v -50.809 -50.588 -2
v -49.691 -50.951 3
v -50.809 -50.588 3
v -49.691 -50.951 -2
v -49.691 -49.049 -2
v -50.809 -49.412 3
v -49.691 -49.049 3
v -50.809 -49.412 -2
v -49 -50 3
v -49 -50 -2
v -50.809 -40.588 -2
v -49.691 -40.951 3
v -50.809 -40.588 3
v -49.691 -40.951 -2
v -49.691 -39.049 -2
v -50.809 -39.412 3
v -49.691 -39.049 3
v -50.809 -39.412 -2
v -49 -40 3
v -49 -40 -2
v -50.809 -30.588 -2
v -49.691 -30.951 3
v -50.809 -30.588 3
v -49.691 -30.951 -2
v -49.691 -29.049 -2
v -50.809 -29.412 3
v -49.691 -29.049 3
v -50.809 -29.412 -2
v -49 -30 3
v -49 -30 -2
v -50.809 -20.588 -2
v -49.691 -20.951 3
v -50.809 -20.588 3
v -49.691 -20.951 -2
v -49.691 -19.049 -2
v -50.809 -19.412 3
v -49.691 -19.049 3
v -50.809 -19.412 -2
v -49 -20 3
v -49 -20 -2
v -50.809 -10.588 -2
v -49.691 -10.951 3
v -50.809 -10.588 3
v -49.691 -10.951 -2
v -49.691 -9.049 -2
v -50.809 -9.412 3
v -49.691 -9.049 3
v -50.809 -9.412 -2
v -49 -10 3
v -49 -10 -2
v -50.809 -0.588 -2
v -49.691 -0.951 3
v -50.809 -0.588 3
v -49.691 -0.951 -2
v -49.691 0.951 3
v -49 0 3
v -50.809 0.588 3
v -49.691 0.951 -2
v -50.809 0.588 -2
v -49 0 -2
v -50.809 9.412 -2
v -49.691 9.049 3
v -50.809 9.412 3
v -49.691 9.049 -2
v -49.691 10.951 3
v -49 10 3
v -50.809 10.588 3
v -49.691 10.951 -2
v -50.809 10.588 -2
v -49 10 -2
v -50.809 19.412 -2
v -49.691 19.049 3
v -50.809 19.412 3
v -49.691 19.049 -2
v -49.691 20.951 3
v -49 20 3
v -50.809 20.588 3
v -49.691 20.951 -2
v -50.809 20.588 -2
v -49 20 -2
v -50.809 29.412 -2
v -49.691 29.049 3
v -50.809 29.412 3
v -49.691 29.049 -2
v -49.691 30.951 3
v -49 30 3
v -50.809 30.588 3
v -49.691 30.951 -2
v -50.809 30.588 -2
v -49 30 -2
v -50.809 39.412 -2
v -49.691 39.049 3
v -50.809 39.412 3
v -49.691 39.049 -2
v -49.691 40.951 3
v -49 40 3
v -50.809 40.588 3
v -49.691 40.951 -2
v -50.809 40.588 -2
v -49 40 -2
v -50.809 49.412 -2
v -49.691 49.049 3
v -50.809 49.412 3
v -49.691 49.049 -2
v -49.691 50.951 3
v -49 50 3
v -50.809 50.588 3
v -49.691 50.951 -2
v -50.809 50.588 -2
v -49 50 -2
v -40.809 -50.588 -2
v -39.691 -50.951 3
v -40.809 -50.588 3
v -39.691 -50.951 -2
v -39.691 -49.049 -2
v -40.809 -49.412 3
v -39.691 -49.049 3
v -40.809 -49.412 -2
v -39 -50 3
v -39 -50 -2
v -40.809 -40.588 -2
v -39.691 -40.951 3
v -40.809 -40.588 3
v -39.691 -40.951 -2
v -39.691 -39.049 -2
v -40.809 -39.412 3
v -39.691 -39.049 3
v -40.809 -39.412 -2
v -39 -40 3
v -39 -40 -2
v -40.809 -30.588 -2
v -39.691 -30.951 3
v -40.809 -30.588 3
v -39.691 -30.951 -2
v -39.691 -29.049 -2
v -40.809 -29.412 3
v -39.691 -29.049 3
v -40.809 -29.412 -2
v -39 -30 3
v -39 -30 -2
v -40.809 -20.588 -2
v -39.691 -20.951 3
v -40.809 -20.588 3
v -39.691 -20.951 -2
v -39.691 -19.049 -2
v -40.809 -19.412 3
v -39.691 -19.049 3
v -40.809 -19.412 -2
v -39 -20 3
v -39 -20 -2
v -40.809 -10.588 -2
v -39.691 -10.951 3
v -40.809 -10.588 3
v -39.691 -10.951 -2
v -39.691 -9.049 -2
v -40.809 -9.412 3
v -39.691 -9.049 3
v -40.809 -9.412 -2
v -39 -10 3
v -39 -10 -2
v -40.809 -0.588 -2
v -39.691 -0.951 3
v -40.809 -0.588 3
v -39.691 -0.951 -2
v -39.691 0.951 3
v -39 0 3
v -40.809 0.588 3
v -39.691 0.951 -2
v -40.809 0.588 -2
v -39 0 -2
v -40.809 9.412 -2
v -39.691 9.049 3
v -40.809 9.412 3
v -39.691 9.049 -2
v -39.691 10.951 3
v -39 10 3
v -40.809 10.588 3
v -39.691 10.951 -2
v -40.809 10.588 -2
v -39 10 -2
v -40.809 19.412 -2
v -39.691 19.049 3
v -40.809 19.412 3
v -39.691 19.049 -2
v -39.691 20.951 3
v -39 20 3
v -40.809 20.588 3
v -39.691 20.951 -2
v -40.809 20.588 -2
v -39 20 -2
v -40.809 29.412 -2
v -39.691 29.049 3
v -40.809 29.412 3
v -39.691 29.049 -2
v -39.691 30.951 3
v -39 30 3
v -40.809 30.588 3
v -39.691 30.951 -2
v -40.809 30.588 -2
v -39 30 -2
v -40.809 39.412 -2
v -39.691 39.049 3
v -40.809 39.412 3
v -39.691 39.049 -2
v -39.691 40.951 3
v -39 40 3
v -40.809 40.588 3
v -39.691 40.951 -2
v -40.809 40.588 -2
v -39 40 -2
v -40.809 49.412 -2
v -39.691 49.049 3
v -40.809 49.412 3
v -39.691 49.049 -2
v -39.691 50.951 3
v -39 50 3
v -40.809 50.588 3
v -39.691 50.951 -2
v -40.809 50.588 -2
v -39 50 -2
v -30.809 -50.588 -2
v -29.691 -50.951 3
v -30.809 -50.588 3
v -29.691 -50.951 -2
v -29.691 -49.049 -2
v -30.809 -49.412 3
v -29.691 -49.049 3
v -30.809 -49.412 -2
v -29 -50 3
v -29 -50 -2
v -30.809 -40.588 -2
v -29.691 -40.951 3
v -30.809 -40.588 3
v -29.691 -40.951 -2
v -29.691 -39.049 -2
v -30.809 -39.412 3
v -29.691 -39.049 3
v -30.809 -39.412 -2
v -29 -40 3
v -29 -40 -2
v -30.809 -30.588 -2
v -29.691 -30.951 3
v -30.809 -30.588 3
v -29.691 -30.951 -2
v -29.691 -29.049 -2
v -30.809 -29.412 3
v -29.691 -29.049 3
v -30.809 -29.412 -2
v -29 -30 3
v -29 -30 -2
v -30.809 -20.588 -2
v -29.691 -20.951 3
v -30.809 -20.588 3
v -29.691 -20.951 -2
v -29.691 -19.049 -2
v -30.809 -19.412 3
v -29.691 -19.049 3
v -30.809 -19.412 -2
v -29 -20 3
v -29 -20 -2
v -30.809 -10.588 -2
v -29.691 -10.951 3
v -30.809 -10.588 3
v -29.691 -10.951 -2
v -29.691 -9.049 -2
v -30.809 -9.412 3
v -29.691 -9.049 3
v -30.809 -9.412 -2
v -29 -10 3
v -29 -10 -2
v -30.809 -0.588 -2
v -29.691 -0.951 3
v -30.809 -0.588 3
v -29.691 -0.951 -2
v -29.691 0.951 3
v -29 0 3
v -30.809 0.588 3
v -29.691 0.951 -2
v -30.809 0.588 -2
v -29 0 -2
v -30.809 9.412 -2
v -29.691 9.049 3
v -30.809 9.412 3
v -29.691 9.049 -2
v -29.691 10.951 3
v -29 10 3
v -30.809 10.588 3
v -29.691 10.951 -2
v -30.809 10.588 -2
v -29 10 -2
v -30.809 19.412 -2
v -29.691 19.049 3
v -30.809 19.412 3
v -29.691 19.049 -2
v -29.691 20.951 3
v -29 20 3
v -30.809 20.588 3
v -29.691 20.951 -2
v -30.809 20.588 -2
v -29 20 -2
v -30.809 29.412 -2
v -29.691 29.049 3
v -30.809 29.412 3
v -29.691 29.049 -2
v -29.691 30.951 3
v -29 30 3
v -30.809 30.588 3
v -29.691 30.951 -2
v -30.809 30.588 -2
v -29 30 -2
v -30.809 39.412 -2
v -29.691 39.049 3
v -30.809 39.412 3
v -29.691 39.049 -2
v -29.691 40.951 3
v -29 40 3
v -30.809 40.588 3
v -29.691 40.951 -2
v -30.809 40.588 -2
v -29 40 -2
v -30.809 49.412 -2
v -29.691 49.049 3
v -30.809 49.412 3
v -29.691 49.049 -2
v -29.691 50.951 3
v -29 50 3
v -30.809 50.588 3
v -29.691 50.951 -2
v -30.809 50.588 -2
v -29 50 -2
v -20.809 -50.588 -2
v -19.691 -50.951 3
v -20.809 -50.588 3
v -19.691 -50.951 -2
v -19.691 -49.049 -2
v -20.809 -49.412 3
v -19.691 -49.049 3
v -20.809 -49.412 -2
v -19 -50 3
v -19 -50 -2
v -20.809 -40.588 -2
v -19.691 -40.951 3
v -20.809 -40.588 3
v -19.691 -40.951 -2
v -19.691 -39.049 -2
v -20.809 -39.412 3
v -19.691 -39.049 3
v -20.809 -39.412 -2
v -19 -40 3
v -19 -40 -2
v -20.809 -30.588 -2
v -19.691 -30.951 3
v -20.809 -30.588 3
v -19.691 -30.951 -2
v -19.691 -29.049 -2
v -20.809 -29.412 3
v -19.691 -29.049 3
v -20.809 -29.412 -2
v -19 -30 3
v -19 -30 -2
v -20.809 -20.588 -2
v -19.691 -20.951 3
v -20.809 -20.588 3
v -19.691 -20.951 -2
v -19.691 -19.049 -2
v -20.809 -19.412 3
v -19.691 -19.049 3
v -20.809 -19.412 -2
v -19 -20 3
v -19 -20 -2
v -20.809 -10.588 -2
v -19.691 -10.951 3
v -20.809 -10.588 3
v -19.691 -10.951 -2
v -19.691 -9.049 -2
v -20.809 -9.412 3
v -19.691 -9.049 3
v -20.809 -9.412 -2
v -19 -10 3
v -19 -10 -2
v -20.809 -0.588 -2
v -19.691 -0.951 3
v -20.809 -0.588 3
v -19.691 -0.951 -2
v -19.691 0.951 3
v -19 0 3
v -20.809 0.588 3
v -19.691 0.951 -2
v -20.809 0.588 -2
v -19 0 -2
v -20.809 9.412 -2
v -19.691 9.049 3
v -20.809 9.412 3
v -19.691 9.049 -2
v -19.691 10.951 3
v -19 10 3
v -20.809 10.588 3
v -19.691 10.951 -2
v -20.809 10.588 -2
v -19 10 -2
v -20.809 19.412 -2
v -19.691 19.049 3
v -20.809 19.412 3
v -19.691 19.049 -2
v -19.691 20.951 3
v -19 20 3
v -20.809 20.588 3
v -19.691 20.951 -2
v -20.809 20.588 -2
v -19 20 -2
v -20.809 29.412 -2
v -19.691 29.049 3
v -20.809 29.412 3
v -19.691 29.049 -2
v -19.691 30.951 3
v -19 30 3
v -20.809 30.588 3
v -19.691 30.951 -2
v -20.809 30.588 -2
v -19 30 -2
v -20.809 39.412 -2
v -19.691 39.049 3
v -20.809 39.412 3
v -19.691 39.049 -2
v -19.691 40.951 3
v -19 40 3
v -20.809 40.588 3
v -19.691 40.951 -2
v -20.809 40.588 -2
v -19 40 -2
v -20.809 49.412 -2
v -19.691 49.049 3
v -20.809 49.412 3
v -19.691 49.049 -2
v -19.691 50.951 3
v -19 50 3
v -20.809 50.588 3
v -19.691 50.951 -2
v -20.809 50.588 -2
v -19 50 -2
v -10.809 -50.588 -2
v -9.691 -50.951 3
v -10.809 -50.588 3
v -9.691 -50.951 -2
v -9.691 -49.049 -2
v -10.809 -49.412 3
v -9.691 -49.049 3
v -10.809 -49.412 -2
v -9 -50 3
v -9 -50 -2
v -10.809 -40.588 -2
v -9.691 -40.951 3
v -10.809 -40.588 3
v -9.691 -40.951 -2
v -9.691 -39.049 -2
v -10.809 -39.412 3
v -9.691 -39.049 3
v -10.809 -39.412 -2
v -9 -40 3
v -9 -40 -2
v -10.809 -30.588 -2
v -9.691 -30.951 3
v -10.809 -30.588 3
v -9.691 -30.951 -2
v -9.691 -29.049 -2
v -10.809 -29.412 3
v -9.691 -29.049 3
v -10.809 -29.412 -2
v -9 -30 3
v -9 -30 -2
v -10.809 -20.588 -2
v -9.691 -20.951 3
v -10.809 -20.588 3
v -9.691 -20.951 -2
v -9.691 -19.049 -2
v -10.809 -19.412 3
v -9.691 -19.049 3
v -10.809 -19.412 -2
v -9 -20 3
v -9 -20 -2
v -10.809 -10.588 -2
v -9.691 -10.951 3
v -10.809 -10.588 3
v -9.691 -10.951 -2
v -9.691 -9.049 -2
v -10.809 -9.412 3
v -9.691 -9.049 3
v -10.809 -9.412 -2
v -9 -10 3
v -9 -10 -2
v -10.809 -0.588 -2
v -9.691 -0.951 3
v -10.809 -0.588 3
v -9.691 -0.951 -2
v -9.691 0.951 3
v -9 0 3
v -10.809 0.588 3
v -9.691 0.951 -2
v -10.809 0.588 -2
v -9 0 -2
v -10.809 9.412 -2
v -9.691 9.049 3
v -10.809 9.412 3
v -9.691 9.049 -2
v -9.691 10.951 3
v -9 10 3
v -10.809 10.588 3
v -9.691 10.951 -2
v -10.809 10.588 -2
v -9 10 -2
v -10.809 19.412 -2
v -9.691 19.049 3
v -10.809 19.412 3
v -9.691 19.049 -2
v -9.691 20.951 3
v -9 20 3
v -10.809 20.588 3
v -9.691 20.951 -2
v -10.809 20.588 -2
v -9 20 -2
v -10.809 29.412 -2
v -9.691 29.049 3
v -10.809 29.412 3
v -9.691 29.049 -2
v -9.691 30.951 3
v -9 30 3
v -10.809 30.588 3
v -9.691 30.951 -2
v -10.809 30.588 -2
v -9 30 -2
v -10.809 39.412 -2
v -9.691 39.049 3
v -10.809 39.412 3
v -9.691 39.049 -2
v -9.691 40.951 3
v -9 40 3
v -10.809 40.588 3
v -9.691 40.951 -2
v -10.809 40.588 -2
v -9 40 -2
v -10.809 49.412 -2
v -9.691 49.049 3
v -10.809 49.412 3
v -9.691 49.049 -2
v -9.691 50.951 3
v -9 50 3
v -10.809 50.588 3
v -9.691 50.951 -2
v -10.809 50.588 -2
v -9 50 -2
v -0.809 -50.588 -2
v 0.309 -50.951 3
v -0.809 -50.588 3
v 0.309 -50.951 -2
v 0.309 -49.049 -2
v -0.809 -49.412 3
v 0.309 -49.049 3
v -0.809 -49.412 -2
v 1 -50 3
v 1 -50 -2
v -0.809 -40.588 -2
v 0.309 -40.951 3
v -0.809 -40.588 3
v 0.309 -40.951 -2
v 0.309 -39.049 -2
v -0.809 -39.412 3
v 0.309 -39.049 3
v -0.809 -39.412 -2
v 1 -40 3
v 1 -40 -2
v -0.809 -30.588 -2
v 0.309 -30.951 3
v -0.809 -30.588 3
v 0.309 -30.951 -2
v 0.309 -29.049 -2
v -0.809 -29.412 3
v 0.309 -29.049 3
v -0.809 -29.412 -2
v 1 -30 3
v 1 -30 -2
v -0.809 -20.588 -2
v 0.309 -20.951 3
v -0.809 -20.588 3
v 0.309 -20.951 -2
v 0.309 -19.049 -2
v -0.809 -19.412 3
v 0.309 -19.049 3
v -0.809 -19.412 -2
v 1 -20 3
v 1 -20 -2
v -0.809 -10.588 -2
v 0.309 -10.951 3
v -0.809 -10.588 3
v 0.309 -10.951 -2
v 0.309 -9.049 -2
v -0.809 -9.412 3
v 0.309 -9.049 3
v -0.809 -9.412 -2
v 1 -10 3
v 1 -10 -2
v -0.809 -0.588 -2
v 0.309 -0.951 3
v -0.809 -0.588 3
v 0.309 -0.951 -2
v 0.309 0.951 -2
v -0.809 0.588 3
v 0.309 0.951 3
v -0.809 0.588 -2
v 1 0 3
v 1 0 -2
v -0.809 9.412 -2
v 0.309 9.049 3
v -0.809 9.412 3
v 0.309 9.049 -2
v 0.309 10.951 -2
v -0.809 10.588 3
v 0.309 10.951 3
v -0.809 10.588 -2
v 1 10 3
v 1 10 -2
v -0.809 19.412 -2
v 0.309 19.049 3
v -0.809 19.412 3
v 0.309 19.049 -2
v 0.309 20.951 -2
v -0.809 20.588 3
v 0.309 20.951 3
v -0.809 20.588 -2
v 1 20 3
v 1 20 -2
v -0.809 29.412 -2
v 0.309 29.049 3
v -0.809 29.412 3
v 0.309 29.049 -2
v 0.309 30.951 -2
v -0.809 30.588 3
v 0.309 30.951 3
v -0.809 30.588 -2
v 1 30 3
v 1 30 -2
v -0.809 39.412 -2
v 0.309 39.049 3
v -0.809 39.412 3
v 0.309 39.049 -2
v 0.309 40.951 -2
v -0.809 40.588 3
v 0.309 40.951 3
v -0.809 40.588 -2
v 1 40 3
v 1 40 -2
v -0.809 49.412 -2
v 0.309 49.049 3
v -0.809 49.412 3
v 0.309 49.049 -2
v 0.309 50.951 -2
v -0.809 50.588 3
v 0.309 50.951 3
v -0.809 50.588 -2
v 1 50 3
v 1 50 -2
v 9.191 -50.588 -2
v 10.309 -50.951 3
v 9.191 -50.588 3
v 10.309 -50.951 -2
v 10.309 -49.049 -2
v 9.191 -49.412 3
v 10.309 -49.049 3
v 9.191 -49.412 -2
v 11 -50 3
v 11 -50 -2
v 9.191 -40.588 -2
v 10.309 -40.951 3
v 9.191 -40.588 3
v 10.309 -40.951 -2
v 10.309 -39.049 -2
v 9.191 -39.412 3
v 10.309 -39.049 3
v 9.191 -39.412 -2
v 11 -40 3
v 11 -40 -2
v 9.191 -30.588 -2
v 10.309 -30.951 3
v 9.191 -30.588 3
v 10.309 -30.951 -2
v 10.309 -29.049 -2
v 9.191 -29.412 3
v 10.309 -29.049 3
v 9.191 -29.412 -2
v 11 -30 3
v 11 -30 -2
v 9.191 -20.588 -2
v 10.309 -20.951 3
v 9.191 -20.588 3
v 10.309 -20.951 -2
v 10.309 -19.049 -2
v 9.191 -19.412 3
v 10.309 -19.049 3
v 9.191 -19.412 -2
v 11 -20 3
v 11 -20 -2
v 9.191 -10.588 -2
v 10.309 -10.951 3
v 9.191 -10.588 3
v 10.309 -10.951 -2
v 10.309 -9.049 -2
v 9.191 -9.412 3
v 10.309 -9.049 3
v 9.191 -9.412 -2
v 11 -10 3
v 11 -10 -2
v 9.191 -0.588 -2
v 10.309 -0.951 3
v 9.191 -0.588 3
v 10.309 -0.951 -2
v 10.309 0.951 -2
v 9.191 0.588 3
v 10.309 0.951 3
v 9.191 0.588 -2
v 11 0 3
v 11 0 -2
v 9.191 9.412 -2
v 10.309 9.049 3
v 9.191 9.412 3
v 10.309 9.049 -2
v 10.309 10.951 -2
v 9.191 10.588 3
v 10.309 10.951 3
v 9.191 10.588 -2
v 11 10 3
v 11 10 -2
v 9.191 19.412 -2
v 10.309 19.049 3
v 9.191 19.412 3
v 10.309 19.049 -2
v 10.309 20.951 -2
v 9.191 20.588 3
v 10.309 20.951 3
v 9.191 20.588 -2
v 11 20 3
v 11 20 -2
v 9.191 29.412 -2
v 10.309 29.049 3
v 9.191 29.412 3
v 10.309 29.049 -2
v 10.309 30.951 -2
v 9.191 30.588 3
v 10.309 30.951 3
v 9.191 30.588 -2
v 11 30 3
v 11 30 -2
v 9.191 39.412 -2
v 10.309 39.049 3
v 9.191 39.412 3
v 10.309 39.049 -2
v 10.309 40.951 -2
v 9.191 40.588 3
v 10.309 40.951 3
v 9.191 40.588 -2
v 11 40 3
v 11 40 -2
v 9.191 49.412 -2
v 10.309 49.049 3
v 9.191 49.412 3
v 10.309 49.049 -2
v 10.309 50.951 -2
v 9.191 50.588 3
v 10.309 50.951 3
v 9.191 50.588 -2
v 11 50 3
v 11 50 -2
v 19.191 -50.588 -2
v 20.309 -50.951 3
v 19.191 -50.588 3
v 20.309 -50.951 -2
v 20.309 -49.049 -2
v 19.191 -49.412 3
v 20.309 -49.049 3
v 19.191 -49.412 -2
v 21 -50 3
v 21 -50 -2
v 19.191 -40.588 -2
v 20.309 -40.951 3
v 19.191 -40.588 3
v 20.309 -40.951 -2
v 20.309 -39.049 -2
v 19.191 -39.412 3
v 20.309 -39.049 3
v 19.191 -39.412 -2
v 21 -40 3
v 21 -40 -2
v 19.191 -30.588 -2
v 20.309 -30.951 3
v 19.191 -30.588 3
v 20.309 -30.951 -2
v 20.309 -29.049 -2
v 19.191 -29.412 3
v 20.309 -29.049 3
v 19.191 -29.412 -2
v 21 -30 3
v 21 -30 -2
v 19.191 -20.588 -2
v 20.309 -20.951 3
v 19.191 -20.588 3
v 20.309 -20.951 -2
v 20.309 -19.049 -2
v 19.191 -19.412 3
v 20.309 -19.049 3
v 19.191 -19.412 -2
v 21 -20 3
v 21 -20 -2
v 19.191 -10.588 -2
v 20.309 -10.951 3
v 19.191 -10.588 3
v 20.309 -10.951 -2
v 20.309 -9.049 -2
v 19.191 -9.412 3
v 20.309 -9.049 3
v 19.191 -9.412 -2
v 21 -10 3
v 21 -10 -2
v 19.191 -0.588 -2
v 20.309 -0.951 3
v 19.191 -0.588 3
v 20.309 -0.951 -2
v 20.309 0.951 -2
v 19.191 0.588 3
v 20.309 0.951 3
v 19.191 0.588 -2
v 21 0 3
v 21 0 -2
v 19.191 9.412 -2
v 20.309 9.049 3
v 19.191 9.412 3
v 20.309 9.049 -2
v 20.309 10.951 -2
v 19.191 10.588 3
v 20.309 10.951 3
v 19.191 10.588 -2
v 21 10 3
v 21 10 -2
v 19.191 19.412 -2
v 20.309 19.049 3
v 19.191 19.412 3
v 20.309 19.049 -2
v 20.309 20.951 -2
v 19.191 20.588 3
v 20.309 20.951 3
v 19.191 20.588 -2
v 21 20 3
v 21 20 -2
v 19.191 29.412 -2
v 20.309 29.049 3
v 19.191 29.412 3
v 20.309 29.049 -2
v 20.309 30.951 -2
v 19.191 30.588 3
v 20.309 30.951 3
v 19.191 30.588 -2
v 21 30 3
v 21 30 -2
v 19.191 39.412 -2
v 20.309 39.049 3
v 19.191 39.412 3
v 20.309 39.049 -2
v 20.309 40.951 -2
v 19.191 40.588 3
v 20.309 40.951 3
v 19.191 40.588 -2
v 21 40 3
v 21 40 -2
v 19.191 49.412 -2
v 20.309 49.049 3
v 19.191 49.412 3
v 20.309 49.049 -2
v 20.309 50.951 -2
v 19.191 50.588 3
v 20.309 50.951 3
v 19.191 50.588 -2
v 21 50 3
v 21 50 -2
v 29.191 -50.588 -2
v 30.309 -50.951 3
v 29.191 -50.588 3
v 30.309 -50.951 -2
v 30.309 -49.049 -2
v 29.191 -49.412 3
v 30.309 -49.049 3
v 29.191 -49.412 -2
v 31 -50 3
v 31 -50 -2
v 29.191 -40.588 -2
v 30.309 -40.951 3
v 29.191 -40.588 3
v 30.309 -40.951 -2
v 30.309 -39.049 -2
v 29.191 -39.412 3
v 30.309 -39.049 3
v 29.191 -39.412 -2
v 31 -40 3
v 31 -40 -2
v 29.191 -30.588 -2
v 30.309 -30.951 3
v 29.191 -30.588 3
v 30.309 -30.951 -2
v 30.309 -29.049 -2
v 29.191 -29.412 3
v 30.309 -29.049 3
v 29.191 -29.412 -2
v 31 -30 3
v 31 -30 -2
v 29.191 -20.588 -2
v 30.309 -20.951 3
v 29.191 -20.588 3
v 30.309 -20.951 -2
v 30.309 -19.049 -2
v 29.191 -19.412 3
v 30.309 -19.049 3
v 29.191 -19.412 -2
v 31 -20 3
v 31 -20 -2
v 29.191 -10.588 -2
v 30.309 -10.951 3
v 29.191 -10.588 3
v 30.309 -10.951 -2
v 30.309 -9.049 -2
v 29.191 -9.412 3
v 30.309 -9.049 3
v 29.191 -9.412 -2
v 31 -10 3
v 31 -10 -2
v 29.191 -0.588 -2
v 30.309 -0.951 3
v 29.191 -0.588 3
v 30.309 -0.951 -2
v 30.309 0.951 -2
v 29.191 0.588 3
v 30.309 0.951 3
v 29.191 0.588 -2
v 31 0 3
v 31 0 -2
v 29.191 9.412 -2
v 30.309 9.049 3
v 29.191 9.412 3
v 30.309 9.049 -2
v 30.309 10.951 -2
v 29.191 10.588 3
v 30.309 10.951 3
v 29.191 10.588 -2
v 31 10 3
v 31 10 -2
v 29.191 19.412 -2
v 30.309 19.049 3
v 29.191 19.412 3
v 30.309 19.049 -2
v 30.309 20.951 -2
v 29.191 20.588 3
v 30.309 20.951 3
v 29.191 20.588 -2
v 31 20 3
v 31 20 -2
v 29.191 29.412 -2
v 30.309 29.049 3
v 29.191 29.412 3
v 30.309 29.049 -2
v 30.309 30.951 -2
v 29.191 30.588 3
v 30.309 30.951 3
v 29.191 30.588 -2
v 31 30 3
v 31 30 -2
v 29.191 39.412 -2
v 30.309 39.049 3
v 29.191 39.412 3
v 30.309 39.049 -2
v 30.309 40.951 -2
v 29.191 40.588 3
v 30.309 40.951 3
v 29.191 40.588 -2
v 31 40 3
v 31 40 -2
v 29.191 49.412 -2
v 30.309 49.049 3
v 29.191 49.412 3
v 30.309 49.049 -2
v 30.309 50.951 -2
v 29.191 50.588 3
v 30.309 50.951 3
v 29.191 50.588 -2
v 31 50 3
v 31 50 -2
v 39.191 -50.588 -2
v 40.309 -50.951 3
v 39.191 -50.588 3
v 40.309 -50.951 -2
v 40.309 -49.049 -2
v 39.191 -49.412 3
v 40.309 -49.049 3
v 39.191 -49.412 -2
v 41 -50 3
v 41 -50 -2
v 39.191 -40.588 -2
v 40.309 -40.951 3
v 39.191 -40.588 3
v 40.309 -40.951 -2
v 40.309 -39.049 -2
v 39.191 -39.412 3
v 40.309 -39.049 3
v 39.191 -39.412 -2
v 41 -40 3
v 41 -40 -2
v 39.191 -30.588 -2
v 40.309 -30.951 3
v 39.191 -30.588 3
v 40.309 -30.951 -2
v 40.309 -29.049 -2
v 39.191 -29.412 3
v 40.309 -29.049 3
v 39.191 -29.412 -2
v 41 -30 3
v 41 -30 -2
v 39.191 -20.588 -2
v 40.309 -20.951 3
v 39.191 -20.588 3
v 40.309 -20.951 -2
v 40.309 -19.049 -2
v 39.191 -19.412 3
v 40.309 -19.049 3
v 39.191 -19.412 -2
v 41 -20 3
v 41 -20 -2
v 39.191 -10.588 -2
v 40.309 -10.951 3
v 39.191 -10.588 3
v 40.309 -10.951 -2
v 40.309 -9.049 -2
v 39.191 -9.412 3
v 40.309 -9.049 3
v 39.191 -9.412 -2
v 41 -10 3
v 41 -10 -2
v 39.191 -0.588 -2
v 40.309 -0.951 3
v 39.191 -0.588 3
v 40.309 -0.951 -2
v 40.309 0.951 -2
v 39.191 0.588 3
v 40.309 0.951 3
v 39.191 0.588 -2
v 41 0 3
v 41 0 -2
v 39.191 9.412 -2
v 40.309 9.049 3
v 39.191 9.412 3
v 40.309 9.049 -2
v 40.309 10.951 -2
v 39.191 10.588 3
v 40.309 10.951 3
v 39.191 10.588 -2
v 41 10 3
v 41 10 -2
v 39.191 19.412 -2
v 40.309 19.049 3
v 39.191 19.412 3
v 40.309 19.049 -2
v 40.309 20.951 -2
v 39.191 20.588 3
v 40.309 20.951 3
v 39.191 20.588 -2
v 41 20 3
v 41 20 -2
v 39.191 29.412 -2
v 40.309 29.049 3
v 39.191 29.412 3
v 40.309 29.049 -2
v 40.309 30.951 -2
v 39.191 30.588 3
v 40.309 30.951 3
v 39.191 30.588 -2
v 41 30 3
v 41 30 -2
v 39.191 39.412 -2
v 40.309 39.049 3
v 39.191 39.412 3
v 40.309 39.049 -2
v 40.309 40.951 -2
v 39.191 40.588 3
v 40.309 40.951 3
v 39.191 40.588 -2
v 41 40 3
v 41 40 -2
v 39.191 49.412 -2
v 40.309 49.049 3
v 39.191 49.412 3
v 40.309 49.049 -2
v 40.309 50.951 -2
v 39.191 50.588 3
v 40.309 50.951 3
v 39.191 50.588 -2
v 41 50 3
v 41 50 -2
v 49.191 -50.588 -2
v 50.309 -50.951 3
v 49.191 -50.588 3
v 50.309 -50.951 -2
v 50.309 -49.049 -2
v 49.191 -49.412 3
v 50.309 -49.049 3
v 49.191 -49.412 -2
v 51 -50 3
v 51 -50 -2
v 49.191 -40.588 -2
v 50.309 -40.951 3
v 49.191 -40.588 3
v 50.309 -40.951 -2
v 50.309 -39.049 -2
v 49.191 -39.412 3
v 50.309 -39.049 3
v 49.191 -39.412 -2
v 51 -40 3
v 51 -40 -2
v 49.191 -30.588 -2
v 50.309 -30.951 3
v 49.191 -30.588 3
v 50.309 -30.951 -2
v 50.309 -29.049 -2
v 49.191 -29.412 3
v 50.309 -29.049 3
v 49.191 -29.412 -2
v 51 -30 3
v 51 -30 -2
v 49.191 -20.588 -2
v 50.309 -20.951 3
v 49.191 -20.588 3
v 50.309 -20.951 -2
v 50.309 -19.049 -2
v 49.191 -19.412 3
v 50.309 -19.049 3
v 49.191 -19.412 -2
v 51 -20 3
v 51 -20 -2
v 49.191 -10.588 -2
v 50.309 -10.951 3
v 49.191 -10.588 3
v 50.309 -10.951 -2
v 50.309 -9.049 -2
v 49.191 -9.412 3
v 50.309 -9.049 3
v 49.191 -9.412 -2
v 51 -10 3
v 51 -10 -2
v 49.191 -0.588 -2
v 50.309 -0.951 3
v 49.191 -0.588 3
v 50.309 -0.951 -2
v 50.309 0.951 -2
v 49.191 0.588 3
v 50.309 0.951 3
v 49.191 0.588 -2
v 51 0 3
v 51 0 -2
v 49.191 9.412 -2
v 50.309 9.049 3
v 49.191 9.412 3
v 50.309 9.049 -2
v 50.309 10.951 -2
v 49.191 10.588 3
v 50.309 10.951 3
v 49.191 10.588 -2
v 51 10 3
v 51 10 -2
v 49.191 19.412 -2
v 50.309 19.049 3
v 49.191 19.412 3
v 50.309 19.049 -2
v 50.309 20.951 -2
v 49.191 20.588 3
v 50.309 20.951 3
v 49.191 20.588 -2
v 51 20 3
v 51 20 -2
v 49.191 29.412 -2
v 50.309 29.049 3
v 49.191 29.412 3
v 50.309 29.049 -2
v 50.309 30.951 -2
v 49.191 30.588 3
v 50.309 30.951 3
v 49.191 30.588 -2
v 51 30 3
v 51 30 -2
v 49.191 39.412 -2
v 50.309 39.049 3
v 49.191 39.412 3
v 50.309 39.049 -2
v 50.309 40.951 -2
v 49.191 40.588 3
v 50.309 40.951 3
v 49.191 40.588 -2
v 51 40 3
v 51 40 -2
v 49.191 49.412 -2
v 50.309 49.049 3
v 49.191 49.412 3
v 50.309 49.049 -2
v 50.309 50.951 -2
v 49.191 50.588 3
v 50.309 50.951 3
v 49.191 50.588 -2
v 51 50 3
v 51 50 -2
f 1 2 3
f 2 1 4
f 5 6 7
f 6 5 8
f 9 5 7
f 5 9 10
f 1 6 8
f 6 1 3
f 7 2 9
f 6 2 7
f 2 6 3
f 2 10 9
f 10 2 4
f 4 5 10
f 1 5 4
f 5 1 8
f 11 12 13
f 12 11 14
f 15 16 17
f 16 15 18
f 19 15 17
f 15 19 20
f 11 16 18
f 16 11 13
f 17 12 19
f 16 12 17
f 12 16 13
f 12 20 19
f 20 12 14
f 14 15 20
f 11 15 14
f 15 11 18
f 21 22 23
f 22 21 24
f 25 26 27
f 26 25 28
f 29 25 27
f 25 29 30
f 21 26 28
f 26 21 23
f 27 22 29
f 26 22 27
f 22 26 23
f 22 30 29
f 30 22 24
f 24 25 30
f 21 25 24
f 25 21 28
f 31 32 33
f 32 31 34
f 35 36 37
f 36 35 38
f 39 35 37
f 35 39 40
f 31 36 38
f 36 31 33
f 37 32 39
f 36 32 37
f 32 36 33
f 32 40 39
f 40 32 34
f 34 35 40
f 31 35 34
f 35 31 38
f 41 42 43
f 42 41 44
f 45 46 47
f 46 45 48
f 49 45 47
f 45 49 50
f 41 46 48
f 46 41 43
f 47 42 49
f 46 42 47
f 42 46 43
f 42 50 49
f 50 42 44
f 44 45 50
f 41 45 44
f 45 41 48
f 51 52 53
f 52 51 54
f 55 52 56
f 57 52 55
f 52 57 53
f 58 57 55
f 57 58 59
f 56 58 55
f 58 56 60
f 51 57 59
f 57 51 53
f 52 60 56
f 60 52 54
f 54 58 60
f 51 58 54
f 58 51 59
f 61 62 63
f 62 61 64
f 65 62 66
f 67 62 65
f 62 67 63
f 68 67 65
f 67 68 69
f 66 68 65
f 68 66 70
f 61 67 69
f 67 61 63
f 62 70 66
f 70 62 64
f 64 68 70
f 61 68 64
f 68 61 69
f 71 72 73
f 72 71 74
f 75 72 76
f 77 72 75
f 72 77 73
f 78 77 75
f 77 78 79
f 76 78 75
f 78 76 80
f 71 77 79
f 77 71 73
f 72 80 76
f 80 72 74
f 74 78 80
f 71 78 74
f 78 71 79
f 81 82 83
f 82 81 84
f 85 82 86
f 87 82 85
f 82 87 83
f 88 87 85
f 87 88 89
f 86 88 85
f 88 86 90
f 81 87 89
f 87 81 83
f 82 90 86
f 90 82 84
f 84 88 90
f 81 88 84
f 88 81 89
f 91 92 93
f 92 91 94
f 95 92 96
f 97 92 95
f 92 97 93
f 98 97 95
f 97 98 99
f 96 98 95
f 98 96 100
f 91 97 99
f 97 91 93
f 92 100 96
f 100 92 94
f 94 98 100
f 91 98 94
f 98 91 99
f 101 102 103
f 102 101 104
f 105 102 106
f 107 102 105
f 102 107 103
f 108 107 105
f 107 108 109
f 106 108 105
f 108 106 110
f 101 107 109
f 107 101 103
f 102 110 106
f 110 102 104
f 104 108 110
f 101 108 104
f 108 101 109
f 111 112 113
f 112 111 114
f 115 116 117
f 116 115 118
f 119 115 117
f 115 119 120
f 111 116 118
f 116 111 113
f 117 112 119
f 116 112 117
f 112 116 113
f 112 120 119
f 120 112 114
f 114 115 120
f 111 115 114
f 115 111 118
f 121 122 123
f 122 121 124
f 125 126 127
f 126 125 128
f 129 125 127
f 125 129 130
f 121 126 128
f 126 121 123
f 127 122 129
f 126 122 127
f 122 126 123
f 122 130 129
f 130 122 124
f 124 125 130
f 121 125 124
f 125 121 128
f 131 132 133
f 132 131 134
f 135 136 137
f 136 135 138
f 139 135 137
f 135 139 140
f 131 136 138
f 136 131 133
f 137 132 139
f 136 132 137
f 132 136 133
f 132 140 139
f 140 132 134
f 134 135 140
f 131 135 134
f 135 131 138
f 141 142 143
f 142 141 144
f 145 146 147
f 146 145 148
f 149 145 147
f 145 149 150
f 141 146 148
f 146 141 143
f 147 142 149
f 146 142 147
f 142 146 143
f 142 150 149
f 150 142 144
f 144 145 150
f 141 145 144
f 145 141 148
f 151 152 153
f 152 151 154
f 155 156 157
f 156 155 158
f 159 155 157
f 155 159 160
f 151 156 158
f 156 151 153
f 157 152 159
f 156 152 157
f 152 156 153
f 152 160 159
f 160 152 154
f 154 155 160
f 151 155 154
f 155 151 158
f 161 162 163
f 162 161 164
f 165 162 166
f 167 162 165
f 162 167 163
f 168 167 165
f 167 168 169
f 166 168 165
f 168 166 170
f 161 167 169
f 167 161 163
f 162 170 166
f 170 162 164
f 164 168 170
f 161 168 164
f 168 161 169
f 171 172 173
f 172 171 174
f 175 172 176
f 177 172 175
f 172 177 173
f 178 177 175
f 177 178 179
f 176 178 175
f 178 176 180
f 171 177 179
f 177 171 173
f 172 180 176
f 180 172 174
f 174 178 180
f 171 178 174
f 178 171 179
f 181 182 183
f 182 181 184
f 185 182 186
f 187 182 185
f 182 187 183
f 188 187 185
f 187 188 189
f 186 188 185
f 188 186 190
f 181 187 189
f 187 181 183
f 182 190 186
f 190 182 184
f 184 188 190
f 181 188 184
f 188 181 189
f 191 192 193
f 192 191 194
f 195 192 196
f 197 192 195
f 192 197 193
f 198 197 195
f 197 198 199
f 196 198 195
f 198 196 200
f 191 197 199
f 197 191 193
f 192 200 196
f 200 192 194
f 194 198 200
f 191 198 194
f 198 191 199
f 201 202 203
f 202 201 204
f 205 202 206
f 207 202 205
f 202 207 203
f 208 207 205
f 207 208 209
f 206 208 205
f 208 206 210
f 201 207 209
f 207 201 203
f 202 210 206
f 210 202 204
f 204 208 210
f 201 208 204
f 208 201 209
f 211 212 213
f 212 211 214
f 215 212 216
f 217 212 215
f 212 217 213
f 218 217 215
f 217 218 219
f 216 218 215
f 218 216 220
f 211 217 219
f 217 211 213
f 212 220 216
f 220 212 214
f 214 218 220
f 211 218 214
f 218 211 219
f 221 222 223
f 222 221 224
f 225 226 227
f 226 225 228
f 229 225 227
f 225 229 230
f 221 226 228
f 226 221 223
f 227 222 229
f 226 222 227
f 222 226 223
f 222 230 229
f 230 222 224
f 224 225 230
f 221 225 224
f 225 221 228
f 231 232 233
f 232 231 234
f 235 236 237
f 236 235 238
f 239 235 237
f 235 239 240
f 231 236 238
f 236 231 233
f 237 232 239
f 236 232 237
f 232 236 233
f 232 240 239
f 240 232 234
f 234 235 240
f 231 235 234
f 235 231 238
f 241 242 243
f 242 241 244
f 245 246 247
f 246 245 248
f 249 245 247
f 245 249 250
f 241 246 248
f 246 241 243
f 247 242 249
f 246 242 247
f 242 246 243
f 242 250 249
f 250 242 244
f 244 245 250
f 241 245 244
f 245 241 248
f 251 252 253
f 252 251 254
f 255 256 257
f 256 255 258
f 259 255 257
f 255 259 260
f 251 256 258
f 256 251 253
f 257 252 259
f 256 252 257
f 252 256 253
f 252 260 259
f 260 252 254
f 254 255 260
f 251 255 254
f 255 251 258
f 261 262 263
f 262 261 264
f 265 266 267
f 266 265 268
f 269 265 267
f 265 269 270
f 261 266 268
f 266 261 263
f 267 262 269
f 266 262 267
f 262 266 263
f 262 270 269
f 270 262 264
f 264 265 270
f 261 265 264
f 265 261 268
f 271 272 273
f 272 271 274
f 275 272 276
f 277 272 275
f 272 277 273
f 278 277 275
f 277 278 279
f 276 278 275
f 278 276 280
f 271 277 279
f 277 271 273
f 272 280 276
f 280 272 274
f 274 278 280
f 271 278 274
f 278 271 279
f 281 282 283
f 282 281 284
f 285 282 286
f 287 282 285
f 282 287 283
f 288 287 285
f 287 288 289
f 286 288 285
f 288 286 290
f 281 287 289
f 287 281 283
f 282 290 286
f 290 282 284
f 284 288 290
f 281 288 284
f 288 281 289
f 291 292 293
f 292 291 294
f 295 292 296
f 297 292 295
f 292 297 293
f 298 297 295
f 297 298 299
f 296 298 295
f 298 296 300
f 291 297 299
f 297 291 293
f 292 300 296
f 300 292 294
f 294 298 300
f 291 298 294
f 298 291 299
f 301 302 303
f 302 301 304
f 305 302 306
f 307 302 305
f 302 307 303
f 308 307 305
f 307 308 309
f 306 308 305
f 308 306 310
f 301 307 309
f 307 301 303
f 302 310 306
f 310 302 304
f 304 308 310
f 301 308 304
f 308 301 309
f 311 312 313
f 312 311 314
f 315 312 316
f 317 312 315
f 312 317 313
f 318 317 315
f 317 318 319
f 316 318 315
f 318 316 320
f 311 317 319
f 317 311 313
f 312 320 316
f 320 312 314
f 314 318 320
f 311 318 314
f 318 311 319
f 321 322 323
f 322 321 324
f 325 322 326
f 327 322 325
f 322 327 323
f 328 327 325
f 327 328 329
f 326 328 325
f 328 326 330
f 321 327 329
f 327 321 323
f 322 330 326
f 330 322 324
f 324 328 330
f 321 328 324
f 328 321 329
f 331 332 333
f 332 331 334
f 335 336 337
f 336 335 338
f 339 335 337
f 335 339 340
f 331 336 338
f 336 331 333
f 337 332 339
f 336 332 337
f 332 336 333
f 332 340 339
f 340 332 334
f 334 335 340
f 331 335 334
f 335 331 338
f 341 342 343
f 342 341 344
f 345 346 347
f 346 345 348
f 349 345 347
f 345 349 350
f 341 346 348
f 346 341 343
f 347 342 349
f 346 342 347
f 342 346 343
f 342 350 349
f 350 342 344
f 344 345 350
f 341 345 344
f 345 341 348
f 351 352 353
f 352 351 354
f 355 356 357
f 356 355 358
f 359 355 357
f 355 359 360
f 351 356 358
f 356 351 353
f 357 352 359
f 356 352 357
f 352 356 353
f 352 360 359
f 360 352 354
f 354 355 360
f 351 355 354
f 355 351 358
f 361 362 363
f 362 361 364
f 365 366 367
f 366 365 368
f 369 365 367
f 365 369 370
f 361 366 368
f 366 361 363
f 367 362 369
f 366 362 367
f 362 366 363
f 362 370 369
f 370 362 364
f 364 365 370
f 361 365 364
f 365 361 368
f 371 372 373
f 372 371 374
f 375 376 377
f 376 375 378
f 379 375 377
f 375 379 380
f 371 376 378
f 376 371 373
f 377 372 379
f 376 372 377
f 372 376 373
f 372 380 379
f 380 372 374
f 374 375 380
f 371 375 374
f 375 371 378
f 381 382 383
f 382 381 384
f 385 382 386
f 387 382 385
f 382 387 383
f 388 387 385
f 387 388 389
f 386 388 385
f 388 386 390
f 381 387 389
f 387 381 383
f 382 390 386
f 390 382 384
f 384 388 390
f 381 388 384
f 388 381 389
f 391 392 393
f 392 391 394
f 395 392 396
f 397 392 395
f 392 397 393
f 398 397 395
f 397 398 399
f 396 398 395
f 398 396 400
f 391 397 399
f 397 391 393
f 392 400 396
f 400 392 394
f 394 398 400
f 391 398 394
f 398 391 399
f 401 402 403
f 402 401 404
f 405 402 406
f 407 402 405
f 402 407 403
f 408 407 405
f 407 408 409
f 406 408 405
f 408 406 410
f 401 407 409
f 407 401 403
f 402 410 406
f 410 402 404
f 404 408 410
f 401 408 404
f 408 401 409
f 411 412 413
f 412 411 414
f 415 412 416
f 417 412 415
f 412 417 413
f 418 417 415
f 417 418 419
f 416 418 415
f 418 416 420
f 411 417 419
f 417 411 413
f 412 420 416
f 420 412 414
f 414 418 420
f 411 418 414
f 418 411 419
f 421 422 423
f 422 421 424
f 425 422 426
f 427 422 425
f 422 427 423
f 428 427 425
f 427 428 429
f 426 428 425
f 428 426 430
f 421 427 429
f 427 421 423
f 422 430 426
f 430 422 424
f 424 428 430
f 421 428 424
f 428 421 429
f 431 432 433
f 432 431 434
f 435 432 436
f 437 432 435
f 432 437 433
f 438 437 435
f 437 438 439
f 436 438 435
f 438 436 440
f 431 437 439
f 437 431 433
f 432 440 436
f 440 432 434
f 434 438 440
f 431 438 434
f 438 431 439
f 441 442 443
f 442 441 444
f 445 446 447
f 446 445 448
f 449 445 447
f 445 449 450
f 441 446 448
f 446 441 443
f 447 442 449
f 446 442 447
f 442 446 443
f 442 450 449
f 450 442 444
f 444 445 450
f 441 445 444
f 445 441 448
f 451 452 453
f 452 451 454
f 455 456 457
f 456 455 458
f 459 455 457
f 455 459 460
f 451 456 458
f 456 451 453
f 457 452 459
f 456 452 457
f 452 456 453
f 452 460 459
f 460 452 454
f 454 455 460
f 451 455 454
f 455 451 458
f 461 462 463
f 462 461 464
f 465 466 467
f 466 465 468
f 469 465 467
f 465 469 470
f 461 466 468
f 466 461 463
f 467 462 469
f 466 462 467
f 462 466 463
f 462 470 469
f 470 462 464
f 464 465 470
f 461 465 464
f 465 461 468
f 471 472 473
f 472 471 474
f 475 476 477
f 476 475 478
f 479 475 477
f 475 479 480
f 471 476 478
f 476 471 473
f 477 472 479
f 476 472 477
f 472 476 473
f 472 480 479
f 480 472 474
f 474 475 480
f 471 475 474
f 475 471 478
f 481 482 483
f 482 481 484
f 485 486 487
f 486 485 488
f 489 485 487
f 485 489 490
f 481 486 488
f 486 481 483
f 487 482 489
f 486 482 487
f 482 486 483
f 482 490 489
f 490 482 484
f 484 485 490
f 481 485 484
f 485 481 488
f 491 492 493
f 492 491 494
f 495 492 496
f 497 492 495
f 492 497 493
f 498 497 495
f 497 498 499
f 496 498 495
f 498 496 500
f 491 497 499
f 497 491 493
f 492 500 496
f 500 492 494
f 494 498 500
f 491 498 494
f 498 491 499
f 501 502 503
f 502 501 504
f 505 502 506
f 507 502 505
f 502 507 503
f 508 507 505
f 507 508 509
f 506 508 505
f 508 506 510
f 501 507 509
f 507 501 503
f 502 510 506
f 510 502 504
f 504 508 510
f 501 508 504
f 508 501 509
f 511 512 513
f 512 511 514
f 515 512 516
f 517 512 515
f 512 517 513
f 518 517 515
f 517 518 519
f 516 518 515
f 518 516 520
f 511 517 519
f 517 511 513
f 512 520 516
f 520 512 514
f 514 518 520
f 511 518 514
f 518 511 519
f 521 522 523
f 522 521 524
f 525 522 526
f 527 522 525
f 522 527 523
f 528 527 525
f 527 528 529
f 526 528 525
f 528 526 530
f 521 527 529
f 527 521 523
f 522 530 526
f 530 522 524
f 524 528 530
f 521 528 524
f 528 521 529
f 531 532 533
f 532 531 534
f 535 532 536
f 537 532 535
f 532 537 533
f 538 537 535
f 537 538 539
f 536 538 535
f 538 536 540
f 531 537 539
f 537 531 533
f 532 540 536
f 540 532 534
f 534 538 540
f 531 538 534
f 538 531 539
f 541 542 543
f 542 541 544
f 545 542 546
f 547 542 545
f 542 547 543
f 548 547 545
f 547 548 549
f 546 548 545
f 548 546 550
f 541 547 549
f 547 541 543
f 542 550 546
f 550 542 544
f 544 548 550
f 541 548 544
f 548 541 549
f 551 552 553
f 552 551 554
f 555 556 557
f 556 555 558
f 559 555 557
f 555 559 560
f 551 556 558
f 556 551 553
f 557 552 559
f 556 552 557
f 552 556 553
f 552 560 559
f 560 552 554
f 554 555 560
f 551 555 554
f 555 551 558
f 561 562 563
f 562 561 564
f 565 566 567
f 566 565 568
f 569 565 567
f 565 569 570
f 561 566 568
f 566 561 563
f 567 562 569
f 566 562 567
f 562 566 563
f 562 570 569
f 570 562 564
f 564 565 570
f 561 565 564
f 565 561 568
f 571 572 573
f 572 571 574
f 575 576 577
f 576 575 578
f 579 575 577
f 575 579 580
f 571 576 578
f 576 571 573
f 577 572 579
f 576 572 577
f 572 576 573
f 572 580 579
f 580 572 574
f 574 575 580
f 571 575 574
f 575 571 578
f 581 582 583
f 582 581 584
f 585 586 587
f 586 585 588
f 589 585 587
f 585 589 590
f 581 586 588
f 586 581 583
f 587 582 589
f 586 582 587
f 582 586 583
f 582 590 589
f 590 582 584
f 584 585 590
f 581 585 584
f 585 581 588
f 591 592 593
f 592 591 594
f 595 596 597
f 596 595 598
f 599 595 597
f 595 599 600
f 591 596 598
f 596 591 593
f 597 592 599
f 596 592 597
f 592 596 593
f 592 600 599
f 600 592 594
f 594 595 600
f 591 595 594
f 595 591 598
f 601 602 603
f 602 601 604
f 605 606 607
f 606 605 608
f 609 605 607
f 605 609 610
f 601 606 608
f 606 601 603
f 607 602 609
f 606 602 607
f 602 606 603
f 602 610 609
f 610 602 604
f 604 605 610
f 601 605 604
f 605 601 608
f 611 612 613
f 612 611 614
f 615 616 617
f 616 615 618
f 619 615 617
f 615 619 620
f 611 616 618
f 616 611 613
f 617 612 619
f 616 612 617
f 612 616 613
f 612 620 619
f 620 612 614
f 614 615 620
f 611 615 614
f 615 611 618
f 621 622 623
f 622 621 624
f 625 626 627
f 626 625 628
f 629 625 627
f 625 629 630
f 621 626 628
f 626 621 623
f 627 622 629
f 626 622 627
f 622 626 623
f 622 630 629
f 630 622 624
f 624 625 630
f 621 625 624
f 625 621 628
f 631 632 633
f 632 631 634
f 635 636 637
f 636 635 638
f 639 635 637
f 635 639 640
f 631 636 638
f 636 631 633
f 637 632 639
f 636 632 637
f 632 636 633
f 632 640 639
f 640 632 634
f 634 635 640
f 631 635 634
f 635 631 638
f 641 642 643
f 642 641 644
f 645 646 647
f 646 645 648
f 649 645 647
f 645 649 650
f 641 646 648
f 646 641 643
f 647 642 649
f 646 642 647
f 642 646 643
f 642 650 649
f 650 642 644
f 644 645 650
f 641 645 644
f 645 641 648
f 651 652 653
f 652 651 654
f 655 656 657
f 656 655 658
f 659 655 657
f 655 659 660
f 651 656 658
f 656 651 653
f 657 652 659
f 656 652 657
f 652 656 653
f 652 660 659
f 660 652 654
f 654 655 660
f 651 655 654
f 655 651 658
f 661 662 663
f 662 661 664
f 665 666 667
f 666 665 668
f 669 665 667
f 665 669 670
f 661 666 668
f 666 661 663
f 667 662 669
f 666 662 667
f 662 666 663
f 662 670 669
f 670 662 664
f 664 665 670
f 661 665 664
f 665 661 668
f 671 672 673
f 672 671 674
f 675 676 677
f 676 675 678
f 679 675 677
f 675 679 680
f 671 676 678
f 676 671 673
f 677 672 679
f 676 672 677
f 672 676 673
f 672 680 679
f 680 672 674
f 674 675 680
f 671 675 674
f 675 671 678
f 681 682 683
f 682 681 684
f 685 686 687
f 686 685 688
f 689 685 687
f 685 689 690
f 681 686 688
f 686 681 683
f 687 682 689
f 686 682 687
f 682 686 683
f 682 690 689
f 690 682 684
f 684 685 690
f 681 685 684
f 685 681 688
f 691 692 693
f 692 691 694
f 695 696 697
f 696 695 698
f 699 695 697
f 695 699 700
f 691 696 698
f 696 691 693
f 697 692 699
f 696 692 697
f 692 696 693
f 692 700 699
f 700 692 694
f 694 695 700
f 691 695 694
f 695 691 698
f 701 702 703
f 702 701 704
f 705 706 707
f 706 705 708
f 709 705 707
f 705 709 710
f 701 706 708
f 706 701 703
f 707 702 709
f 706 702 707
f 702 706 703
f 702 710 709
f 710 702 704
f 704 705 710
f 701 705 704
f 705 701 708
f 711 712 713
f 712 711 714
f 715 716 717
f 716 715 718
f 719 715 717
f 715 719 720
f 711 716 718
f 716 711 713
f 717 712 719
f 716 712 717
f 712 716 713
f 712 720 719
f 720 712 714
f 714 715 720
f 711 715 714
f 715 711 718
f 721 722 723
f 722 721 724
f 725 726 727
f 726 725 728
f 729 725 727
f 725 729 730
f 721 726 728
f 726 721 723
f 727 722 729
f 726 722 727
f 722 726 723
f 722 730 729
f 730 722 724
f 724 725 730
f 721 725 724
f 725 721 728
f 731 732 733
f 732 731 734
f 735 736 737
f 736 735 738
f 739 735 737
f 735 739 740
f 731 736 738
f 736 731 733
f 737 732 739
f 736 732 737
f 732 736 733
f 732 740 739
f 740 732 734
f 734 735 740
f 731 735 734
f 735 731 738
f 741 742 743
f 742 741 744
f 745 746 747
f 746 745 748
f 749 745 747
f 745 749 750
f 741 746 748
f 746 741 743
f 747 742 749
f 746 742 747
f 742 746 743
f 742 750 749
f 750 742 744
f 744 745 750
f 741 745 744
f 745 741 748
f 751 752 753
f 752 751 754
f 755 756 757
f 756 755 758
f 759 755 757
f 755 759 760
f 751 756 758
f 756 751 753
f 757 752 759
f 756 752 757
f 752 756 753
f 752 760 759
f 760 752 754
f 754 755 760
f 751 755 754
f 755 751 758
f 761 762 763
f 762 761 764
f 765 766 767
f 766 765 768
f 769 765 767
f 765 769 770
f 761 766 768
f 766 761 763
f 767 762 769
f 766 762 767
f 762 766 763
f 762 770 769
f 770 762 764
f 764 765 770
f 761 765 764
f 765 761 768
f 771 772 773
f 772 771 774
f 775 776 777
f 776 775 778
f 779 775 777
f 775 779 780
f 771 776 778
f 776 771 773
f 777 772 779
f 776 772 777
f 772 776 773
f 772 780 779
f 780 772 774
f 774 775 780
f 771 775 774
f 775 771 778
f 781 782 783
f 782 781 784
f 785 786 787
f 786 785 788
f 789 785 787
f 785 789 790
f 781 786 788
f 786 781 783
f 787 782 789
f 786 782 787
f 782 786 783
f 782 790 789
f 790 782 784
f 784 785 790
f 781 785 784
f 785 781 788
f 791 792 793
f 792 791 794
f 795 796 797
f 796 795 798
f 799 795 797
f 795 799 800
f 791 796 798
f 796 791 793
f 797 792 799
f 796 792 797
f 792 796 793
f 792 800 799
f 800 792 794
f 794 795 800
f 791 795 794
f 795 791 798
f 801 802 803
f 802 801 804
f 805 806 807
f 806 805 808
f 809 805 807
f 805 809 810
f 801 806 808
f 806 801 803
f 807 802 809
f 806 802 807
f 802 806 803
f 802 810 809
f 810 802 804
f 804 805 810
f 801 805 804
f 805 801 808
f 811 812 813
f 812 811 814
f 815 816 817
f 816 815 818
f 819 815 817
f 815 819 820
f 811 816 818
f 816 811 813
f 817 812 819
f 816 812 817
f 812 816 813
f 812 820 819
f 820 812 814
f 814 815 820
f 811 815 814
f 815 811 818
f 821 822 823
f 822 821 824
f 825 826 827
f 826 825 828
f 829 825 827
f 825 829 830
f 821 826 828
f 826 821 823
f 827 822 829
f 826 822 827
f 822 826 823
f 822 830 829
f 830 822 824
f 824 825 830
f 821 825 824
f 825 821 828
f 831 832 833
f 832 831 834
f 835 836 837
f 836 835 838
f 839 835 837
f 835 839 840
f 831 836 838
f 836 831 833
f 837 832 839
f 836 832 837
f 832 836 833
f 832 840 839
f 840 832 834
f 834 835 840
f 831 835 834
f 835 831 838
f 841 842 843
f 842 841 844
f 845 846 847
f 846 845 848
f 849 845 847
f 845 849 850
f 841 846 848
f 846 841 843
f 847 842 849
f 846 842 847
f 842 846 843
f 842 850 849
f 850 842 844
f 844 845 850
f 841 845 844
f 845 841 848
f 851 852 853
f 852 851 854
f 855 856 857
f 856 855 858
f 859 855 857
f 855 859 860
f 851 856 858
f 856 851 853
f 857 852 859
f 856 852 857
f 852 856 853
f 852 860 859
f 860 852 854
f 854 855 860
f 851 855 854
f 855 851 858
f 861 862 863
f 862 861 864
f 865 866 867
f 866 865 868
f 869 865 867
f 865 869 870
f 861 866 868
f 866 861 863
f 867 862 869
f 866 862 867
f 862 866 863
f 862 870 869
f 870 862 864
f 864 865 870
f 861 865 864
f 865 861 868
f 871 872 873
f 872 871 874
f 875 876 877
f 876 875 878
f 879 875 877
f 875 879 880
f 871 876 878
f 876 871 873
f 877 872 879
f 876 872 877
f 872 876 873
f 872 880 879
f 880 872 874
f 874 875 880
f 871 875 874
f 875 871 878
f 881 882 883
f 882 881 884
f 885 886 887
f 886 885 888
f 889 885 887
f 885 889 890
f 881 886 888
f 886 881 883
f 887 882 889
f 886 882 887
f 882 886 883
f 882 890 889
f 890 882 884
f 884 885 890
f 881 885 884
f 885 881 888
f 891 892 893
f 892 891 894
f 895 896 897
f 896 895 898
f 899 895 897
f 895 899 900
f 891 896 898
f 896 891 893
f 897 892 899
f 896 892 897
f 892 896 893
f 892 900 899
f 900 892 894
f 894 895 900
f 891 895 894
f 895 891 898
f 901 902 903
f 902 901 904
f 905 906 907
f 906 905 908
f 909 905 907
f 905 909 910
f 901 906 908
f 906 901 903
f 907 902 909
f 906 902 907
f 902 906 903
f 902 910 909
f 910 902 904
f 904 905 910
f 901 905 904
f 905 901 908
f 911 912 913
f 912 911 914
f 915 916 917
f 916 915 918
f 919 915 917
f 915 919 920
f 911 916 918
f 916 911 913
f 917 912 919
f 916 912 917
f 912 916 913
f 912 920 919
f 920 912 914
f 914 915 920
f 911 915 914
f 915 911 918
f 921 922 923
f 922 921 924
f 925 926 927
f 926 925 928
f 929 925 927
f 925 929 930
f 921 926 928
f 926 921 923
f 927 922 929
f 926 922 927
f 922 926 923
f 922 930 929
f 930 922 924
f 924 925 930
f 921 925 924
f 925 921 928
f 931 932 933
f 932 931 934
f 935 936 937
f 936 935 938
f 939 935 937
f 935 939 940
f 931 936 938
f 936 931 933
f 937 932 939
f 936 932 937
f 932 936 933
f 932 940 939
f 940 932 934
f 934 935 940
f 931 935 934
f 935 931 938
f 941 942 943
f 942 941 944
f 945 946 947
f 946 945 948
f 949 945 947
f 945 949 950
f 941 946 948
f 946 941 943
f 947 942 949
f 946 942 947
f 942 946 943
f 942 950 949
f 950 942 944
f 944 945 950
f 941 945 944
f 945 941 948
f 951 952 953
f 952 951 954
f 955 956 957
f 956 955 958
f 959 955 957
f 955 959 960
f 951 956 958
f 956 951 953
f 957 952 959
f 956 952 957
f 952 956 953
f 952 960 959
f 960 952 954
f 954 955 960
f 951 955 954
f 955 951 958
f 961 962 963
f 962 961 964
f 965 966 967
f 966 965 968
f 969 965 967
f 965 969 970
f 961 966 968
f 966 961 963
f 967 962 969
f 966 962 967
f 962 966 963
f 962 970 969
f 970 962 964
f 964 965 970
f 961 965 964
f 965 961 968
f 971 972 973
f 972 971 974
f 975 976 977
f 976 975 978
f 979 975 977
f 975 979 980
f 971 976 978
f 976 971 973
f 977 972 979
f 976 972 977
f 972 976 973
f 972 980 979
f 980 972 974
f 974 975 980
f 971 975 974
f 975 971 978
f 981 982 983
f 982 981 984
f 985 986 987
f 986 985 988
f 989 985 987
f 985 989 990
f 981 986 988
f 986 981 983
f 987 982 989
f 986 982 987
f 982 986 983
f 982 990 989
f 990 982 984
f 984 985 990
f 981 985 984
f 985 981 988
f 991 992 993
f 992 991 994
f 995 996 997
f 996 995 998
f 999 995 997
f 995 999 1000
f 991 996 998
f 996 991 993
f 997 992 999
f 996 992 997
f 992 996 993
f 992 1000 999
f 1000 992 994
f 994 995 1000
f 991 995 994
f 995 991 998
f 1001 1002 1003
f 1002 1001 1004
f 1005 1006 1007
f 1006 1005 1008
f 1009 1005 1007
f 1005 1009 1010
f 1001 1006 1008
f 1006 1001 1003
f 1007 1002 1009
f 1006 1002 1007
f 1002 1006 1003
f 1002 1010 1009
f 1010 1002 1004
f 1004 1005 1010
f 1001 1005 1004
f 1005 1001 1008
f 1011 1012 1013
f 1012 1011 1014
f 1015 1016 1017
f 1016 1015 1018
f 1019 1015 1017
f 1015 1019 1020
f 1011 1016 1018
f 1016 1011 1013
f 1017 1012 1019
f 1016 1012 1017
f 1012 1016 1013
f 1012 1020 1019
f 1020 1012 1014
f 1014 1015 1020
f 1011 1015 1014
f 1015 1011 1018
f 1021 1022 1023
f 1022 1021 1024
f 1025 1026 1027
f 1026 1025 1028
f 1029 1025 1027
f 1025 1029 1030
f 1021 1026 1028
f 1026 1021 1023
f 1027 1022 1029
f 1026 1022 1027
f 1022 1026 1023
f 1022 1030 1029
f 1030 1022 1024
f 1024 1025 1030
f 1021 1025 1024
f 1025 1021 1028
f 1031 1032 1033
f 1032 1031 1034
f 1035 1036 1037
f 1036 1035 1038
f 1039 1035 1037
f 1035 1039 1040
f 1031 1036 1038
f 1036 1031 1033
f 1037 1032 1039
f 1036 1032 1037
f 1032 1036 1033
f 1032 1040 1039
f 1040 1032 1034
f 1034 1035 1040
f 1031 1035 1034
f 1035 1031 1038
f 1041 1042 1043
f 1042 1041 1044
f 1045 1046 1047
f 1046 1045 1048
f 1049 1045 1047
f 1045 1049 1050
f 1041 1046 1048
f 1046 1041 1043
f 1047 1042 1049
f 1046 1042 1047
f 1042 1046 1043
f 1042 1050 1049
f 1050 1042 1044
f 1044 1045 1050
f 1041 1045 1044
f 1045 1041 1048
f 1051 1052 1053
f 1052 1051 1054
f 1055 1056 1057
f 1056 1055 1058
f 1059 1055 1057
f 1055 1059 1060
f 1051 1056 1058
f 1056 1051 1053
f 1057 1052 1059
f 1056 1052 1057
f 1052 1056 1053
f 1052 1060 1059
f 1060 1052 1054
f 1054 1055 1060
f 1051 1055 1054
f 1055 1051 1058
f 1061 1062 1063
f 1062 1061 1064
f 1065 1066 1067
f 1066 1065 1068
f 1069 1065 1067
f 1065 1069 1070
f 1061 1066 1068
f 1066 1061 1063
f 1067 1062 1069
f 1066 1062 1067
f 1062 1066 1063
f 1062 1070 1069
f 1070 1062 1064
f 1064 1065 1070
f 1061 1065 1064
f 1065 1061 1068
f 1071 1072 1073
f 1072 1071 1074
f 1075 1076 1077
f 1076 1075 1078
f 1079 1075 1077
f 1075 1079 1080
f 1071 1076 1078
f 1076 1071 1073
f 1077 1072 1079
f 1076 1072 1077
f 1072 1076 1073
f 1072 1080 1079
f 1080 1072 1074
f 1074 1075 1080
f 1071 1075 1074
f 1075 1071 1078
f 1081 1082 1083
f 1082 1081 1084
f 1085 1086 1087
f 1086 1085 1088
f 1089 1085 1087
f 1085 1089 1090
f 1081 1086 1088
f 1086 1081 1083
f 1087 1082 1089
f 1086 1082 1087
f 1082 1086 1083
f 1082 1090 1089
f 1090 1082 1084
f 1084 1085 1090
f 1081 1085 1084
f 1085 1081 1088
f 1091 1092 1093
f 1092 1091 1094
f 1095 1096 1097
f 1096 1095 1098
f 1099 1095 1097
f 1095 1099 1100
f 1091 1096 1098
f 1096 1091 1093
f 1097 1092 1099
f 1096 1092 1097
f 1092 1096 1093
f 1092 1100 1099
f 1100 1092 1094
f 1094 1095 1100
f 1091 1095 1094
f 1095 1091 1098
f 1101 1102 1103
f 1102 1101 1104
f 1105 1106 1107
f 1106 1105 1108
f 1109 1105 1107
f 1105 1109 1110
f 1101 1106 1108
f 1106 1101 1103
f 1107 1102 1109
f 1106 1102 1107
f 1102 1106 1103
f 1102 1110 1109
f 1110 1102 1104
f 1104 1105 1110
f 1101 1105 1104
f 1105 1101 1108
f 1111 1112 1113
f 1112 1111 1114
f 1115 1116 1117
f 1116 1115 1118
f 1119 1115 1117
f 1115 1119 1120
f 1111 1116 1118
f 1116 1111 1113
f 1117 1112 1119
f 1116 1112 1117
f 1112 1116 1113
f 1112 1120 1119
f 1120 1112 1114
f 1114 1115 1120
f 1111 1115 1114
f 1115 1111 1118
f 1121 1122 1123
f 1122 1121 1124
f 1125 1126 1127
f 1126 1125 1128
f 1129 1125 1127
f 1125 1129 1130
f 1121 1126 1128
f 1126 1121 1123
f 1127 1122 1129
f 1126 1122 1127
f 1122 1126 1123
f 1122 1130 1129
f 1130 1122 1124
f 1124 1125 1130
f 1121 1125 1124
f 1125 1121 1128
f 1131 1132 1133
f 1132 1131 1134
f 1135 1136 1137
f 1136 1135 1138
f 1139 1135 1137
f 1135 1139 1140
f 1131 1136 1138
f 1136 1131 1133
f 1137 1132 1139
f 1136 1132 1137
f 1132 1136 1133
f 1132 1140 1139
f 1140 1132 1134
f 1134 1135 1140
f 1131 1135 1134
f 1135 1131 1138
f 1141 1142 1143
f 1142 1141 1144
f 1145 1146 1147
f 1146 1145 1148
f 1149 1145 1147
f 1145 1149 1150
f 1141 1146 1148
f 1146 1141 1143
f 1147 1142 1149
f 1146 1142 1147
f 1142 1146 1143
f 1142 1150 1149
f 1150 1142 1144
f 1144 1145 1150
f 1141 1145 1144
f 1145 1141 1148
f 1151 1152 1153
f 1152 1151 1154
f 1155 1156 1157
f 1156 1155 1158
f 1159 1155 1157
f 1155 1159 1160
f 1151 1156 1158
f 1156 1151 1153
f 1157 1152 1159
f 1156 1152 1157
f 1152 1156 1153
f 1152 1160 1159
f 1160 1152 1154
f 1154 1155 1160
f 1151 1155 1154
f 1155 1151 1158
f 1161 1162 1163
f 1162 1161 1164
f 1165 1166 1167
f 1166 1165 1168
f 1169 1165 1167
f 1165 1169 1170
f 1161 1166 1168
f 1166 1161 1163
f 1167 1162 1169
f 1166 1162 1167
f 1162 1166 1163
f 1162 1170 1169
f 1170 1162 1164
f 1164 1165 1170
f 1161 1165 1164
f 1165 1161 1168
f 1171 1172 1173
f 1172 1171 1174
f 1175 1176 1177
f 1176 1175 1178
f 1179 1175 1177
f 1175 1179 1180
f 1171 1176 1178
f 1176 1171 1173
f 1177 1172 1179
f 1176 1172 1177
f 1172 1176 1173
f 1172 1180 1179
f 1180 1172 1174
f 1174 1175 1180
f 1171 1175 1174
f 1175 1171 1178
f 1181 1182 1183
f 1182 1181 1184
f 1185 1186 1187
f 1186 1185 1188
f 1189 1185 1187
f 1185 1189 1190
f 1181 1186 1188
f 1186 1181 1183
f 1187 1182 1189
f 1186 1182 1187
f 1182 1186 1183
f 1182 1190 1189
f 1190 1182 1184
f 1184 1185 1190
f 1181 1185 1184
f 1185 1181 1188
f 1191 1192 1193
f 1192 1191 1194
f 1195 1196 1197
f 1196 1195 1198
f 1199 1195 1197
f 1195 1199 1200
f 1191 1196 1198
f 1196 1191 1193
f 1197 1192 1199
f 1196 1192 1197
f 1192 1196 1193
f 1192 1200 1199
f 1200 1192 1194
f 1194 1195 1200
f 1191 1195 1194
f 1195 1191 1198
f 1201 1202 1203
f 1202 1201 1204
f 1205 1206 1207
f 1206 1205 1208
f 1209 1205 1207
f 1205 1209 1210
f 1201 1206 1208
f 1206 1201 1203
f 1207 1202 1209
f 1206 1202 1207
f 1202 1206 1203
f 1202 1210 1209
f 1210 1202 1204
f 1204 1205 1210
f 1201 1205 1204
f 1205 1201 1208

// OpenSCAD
//  This is a quick customizable way to make an array of columns of any size and any size columns


//Defines the area of the  array
a=100;

//Defines the radius of the columns
r=1; //size

//Defines the thickness of the columns
t=5;

//Defines the spacing of the columns
s=10; //space


module array() {

  q = floor(a/2/s);
    for (x=[-q:q])
      for (y=[-q:q])
        translate([x*s,y*s,r/2])
          cylinder(h=t, r=r, ,center=true);
}


array();
